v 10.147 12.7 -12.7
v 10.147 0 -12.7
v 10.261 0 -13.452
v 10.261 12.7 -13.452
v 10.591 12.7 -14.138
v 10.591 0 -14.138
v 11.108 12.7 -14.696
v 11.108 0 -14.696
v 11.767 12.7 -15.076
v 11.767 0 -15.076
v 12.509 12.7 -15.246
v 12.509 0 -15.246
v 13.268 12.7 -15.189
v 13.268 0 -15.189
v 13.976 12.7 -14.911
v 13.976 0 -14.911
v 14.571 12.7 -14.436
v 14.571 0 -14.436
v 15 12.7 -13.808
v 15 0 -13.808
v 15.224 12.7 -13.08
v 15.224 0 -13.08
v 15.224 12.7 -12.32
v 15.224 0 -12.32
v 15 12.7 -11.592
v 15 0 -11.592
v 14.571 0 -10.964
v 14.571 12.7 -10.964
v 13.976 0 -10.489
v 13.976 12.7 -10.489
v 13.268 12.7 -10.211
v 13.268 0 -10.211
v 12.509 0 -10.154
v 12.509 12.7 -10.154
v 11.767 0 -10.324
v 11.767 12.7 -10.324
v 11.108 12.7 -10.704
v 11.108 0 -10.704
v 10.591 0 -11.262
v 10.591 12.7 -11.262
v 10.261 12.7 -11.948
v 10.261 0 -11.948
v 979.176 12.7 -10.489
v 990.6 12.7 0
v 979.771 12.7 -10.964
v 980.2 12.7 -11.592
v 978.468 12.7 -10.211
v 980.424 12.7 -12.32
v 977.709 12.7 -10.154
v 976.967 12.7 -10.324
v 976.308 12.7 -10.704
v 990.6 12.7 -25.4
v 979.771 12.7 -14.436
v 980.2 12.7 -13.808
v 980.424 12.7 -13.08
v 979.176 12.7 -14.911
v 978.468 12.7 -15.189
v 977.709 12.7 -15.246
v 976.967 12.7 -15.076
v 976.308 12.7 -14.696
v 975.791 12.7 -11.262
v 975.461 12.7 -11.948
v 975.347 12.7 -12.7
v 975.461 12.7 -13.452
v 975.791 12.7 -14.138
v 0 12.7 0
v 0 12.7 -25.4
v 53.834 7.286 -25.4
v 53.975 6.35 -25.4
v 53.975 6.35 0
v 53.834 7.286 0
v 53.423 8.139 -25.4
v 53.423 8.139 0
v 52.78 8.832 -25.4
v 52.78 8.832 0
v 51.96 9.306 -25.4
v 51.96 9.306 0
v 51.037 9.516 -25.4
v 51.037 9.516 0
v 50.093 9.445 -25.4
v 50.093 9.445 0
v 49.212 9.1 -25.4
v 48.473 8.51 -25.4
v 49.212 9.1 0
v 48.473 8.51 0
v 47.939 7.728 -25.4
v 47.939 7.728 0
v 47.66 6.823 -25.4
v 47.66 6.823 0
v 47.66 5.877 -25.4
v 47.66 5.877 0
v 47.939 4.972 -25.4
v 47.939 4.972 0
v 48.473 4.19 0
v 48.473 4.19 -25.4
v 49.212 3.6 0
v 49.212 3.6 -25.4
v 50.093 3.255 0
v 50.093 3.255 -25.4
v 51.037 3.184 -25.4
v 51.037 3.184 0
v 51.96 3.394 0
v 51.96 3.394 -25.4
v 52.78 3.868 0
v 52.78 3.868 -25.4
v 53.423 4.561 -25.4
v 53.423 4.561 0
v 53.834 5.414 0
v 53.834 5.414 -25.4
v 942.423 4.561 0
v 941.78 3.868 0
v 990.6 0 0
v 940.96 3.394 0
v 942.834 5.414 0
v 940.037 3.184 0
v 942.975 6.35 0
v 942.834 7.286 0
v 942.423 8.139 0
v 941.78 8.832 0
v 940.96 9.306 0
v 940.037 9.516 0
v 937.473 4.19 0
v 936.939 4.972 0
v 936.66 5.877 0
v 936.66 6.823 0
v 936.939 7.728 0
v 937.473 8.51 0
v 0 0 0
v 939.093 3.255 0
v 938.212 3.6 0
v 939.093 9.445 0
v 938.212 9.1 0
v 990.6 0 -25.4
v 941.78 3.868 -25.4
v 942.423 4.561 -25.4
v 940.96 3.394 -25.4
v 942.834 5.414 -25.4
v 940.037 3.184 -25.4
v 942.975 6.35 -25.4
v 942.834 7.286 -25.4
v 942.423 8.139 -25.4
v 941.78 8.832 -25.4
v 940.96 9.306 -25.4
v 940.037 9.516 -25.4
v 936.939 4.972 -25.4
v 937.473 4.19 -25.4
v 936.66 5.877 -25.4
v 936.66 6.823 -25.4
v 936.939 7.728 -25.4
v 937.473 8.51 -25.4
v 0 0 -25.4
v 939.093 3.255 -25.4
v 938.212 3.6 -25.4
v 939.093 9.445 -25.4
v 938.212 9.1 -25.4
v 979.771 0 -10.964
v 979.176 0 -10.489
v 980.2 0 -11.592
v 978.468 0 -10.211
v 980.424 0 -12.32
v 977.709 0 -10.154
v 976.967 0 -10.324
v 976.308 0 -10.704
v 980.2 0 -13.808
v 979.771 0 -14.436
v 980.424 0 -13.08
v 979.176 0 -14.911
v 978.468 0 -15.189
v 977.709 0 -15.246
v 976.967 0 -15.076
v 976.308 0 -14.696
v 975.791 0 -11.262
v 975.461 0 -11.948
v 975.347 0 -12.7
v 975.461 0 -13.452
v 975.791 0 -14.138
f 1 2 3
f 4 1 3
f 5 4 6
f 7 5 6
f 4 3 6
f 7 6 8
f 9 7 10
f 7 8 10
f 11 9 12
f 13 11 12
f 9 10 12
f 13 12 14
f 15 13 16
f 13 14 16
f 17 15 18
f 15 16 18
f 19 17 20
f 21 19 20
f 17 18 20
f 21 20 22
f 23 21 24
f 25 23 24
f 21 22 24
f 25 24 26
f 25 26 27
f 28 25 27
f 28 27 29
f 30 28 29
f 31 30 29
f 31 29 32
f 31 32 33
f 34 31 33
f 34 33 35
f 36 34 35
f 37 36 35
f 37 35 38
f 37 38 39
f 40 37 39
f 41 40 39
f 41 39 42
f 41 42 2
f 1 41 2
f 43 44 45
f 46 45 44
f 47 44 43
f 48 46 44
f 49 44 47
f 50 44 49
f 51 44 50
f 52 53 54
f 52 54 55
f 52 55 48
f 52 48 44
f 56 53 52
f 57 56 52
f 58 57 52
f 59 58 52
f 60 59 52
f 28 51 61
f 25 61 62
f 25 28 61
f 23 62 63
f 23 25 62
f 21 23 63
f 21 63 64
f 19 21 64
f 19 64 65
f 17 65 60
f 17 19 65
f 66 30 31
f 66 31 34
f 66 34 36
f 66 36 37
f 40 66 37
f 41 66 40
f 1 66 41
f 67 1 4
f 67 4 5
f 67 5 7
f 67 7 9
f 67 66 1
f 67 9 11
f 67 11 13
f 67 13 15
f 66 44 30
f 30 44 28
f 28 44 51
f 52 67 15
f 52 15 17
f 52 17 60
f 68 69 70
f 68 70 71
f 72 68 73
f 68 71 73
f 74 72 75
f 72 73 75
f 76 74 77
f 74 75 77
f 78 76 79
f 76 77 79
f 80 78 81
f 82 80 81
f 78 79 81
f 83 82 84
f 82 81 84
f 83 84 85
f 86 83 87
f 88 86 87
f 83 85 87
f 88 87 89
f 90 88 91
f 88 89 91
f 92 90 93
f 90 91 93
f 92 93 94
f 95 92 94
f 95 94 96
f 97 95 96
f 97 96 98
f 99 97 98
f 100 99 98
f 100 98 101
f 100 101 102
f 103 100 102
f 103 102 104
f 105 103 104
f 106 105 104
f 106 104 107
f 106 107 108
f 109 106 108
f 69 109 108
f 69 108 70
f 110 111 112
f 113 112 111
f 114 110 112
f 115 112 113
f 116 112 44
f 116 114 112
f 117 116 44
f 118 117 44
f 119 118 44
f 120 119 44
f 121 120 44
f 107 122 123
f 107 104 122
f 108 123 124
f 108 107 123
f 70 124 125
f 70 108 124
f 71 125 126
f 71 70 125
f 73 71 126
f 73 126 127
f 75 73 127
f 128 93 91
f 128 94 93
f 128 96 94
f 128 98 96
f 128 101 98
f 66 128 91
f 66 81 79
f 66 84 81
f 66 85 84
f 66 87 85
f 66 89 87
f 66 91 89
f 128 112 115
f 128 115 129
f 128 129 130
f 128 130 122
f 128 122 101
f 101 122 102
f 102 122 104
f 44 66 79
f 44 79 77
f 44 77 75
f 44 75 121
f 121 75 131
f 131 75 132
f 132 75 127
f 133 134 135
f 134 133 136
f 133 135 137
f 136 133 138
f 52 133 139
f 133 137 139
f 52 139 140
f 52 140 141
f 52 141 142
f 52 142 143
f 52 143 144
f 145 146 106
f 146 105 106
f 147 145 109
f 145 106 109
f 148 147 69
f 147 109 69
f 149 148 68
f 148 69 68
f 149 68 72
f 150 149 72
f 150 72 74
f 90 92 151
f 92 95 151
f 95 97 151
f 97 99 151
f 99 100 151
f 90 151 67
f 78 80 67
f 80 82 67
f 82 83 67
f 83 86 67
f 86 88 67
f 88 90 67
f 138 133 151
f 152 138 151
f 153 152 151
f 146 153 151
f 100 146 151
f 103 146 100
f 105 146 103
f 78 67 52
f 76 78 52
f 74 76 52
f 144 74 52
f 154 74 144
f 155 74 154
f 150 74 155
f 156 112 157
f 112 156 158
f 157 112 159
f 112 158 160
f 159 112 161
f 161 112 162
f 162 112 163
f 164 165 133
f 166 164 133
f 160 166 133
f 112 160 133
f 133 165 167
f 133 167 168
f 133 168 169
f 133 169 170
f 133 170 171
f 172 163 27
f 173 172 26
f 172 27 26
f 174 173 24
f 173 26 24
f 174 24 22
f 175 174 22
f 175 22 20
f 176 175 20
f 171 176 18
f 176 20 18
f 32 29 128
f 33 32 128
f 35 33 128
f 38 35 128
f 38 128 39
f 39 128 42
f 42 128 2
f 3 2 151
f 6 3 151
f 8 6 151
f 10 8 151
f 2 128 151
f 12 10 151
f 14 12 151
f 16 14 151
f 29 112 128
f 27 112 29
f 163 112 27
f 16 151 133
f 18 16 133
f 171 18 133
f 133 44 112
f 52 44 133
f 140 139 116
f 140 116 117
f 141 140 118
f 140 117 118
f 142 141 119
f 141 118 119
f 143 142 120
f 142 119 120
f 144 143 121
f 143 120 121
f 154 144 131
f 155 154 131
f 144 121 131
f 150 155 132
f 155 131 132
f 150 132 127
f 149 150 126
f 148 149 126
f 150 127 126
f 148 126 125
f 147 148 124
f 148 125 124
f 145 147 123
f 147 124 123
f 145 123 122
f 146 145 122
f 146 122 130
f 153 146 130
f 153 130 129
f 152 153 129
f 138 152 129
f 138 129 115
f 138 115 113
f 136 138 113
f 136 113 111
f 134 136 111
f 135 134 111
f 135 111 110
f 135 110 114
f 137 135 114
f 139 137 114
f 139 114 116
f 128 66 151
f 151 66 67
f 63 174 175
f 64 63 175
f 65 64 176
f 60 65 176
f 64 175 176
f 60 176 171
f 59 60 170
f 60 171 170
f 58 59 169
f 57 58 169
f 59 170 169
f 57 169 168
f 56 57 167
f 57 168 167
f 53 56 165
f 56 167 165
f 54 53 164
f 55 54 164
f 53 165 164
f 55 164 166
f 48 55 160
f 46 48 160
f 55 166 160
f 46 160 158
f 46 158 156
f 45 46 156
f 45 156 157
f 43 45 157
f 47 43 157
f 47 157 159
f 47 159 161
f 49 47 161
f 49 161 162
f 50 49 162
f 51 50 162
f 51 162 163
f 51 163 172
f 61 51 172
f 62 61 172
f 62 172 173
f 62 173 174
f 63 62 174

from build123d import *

# Parameters (mm, degrees)
SKETCH1_W                   = 25.4
SKETCH1_H                   = 12.7
BOSS_EXTRUDE1_DEPTH         = 990.6
F_1_4_20_TAPPED_HOLE1_D     = 5.1054
F_1_4_0_25_DIAMETER_HOLE1_D = 6.35


with BuildPart() as part:
    # Sketch1 → Boss-Extrude1 (new body)
    with BuildSketch(Plane(origin=(0, 0, 0), x_dir=(0, 0, -1), z_dir=(1, 0, 0))):
        with Locations((12.7, 6.35)):
            Rectangle(SKETCH1_W, SKETCH1_H)
    extrude(amount=BOSS_EXTRUDE1_DEPTH)

    # 1/4-20 Tapped Hole1 (through all)
    with Locations(Plane(origin=(0, 12.7, 0), x_dir=(1, 0, 0), z_dir=(0, 1, 0))):
        with Locations((12.7, 12.7), (977.9, 12.7)):
            Hole(F_1_4_20_TAPPED_HOLE1_D / 2)

    # 1/4 (0.25) Diameter Hole1 (through all)
    with Locations(Plane(origin=(0, 0, -25.4), x_dir=(-1, 0, 0), z_dir=(0, 0, -1))):
        with Locations((-939.8, 6.35), (-50.8, 6.35)):
            Hole(F_1_4_0_25_DIAMETER_HOLE1_D / 2)


solid = part.part
